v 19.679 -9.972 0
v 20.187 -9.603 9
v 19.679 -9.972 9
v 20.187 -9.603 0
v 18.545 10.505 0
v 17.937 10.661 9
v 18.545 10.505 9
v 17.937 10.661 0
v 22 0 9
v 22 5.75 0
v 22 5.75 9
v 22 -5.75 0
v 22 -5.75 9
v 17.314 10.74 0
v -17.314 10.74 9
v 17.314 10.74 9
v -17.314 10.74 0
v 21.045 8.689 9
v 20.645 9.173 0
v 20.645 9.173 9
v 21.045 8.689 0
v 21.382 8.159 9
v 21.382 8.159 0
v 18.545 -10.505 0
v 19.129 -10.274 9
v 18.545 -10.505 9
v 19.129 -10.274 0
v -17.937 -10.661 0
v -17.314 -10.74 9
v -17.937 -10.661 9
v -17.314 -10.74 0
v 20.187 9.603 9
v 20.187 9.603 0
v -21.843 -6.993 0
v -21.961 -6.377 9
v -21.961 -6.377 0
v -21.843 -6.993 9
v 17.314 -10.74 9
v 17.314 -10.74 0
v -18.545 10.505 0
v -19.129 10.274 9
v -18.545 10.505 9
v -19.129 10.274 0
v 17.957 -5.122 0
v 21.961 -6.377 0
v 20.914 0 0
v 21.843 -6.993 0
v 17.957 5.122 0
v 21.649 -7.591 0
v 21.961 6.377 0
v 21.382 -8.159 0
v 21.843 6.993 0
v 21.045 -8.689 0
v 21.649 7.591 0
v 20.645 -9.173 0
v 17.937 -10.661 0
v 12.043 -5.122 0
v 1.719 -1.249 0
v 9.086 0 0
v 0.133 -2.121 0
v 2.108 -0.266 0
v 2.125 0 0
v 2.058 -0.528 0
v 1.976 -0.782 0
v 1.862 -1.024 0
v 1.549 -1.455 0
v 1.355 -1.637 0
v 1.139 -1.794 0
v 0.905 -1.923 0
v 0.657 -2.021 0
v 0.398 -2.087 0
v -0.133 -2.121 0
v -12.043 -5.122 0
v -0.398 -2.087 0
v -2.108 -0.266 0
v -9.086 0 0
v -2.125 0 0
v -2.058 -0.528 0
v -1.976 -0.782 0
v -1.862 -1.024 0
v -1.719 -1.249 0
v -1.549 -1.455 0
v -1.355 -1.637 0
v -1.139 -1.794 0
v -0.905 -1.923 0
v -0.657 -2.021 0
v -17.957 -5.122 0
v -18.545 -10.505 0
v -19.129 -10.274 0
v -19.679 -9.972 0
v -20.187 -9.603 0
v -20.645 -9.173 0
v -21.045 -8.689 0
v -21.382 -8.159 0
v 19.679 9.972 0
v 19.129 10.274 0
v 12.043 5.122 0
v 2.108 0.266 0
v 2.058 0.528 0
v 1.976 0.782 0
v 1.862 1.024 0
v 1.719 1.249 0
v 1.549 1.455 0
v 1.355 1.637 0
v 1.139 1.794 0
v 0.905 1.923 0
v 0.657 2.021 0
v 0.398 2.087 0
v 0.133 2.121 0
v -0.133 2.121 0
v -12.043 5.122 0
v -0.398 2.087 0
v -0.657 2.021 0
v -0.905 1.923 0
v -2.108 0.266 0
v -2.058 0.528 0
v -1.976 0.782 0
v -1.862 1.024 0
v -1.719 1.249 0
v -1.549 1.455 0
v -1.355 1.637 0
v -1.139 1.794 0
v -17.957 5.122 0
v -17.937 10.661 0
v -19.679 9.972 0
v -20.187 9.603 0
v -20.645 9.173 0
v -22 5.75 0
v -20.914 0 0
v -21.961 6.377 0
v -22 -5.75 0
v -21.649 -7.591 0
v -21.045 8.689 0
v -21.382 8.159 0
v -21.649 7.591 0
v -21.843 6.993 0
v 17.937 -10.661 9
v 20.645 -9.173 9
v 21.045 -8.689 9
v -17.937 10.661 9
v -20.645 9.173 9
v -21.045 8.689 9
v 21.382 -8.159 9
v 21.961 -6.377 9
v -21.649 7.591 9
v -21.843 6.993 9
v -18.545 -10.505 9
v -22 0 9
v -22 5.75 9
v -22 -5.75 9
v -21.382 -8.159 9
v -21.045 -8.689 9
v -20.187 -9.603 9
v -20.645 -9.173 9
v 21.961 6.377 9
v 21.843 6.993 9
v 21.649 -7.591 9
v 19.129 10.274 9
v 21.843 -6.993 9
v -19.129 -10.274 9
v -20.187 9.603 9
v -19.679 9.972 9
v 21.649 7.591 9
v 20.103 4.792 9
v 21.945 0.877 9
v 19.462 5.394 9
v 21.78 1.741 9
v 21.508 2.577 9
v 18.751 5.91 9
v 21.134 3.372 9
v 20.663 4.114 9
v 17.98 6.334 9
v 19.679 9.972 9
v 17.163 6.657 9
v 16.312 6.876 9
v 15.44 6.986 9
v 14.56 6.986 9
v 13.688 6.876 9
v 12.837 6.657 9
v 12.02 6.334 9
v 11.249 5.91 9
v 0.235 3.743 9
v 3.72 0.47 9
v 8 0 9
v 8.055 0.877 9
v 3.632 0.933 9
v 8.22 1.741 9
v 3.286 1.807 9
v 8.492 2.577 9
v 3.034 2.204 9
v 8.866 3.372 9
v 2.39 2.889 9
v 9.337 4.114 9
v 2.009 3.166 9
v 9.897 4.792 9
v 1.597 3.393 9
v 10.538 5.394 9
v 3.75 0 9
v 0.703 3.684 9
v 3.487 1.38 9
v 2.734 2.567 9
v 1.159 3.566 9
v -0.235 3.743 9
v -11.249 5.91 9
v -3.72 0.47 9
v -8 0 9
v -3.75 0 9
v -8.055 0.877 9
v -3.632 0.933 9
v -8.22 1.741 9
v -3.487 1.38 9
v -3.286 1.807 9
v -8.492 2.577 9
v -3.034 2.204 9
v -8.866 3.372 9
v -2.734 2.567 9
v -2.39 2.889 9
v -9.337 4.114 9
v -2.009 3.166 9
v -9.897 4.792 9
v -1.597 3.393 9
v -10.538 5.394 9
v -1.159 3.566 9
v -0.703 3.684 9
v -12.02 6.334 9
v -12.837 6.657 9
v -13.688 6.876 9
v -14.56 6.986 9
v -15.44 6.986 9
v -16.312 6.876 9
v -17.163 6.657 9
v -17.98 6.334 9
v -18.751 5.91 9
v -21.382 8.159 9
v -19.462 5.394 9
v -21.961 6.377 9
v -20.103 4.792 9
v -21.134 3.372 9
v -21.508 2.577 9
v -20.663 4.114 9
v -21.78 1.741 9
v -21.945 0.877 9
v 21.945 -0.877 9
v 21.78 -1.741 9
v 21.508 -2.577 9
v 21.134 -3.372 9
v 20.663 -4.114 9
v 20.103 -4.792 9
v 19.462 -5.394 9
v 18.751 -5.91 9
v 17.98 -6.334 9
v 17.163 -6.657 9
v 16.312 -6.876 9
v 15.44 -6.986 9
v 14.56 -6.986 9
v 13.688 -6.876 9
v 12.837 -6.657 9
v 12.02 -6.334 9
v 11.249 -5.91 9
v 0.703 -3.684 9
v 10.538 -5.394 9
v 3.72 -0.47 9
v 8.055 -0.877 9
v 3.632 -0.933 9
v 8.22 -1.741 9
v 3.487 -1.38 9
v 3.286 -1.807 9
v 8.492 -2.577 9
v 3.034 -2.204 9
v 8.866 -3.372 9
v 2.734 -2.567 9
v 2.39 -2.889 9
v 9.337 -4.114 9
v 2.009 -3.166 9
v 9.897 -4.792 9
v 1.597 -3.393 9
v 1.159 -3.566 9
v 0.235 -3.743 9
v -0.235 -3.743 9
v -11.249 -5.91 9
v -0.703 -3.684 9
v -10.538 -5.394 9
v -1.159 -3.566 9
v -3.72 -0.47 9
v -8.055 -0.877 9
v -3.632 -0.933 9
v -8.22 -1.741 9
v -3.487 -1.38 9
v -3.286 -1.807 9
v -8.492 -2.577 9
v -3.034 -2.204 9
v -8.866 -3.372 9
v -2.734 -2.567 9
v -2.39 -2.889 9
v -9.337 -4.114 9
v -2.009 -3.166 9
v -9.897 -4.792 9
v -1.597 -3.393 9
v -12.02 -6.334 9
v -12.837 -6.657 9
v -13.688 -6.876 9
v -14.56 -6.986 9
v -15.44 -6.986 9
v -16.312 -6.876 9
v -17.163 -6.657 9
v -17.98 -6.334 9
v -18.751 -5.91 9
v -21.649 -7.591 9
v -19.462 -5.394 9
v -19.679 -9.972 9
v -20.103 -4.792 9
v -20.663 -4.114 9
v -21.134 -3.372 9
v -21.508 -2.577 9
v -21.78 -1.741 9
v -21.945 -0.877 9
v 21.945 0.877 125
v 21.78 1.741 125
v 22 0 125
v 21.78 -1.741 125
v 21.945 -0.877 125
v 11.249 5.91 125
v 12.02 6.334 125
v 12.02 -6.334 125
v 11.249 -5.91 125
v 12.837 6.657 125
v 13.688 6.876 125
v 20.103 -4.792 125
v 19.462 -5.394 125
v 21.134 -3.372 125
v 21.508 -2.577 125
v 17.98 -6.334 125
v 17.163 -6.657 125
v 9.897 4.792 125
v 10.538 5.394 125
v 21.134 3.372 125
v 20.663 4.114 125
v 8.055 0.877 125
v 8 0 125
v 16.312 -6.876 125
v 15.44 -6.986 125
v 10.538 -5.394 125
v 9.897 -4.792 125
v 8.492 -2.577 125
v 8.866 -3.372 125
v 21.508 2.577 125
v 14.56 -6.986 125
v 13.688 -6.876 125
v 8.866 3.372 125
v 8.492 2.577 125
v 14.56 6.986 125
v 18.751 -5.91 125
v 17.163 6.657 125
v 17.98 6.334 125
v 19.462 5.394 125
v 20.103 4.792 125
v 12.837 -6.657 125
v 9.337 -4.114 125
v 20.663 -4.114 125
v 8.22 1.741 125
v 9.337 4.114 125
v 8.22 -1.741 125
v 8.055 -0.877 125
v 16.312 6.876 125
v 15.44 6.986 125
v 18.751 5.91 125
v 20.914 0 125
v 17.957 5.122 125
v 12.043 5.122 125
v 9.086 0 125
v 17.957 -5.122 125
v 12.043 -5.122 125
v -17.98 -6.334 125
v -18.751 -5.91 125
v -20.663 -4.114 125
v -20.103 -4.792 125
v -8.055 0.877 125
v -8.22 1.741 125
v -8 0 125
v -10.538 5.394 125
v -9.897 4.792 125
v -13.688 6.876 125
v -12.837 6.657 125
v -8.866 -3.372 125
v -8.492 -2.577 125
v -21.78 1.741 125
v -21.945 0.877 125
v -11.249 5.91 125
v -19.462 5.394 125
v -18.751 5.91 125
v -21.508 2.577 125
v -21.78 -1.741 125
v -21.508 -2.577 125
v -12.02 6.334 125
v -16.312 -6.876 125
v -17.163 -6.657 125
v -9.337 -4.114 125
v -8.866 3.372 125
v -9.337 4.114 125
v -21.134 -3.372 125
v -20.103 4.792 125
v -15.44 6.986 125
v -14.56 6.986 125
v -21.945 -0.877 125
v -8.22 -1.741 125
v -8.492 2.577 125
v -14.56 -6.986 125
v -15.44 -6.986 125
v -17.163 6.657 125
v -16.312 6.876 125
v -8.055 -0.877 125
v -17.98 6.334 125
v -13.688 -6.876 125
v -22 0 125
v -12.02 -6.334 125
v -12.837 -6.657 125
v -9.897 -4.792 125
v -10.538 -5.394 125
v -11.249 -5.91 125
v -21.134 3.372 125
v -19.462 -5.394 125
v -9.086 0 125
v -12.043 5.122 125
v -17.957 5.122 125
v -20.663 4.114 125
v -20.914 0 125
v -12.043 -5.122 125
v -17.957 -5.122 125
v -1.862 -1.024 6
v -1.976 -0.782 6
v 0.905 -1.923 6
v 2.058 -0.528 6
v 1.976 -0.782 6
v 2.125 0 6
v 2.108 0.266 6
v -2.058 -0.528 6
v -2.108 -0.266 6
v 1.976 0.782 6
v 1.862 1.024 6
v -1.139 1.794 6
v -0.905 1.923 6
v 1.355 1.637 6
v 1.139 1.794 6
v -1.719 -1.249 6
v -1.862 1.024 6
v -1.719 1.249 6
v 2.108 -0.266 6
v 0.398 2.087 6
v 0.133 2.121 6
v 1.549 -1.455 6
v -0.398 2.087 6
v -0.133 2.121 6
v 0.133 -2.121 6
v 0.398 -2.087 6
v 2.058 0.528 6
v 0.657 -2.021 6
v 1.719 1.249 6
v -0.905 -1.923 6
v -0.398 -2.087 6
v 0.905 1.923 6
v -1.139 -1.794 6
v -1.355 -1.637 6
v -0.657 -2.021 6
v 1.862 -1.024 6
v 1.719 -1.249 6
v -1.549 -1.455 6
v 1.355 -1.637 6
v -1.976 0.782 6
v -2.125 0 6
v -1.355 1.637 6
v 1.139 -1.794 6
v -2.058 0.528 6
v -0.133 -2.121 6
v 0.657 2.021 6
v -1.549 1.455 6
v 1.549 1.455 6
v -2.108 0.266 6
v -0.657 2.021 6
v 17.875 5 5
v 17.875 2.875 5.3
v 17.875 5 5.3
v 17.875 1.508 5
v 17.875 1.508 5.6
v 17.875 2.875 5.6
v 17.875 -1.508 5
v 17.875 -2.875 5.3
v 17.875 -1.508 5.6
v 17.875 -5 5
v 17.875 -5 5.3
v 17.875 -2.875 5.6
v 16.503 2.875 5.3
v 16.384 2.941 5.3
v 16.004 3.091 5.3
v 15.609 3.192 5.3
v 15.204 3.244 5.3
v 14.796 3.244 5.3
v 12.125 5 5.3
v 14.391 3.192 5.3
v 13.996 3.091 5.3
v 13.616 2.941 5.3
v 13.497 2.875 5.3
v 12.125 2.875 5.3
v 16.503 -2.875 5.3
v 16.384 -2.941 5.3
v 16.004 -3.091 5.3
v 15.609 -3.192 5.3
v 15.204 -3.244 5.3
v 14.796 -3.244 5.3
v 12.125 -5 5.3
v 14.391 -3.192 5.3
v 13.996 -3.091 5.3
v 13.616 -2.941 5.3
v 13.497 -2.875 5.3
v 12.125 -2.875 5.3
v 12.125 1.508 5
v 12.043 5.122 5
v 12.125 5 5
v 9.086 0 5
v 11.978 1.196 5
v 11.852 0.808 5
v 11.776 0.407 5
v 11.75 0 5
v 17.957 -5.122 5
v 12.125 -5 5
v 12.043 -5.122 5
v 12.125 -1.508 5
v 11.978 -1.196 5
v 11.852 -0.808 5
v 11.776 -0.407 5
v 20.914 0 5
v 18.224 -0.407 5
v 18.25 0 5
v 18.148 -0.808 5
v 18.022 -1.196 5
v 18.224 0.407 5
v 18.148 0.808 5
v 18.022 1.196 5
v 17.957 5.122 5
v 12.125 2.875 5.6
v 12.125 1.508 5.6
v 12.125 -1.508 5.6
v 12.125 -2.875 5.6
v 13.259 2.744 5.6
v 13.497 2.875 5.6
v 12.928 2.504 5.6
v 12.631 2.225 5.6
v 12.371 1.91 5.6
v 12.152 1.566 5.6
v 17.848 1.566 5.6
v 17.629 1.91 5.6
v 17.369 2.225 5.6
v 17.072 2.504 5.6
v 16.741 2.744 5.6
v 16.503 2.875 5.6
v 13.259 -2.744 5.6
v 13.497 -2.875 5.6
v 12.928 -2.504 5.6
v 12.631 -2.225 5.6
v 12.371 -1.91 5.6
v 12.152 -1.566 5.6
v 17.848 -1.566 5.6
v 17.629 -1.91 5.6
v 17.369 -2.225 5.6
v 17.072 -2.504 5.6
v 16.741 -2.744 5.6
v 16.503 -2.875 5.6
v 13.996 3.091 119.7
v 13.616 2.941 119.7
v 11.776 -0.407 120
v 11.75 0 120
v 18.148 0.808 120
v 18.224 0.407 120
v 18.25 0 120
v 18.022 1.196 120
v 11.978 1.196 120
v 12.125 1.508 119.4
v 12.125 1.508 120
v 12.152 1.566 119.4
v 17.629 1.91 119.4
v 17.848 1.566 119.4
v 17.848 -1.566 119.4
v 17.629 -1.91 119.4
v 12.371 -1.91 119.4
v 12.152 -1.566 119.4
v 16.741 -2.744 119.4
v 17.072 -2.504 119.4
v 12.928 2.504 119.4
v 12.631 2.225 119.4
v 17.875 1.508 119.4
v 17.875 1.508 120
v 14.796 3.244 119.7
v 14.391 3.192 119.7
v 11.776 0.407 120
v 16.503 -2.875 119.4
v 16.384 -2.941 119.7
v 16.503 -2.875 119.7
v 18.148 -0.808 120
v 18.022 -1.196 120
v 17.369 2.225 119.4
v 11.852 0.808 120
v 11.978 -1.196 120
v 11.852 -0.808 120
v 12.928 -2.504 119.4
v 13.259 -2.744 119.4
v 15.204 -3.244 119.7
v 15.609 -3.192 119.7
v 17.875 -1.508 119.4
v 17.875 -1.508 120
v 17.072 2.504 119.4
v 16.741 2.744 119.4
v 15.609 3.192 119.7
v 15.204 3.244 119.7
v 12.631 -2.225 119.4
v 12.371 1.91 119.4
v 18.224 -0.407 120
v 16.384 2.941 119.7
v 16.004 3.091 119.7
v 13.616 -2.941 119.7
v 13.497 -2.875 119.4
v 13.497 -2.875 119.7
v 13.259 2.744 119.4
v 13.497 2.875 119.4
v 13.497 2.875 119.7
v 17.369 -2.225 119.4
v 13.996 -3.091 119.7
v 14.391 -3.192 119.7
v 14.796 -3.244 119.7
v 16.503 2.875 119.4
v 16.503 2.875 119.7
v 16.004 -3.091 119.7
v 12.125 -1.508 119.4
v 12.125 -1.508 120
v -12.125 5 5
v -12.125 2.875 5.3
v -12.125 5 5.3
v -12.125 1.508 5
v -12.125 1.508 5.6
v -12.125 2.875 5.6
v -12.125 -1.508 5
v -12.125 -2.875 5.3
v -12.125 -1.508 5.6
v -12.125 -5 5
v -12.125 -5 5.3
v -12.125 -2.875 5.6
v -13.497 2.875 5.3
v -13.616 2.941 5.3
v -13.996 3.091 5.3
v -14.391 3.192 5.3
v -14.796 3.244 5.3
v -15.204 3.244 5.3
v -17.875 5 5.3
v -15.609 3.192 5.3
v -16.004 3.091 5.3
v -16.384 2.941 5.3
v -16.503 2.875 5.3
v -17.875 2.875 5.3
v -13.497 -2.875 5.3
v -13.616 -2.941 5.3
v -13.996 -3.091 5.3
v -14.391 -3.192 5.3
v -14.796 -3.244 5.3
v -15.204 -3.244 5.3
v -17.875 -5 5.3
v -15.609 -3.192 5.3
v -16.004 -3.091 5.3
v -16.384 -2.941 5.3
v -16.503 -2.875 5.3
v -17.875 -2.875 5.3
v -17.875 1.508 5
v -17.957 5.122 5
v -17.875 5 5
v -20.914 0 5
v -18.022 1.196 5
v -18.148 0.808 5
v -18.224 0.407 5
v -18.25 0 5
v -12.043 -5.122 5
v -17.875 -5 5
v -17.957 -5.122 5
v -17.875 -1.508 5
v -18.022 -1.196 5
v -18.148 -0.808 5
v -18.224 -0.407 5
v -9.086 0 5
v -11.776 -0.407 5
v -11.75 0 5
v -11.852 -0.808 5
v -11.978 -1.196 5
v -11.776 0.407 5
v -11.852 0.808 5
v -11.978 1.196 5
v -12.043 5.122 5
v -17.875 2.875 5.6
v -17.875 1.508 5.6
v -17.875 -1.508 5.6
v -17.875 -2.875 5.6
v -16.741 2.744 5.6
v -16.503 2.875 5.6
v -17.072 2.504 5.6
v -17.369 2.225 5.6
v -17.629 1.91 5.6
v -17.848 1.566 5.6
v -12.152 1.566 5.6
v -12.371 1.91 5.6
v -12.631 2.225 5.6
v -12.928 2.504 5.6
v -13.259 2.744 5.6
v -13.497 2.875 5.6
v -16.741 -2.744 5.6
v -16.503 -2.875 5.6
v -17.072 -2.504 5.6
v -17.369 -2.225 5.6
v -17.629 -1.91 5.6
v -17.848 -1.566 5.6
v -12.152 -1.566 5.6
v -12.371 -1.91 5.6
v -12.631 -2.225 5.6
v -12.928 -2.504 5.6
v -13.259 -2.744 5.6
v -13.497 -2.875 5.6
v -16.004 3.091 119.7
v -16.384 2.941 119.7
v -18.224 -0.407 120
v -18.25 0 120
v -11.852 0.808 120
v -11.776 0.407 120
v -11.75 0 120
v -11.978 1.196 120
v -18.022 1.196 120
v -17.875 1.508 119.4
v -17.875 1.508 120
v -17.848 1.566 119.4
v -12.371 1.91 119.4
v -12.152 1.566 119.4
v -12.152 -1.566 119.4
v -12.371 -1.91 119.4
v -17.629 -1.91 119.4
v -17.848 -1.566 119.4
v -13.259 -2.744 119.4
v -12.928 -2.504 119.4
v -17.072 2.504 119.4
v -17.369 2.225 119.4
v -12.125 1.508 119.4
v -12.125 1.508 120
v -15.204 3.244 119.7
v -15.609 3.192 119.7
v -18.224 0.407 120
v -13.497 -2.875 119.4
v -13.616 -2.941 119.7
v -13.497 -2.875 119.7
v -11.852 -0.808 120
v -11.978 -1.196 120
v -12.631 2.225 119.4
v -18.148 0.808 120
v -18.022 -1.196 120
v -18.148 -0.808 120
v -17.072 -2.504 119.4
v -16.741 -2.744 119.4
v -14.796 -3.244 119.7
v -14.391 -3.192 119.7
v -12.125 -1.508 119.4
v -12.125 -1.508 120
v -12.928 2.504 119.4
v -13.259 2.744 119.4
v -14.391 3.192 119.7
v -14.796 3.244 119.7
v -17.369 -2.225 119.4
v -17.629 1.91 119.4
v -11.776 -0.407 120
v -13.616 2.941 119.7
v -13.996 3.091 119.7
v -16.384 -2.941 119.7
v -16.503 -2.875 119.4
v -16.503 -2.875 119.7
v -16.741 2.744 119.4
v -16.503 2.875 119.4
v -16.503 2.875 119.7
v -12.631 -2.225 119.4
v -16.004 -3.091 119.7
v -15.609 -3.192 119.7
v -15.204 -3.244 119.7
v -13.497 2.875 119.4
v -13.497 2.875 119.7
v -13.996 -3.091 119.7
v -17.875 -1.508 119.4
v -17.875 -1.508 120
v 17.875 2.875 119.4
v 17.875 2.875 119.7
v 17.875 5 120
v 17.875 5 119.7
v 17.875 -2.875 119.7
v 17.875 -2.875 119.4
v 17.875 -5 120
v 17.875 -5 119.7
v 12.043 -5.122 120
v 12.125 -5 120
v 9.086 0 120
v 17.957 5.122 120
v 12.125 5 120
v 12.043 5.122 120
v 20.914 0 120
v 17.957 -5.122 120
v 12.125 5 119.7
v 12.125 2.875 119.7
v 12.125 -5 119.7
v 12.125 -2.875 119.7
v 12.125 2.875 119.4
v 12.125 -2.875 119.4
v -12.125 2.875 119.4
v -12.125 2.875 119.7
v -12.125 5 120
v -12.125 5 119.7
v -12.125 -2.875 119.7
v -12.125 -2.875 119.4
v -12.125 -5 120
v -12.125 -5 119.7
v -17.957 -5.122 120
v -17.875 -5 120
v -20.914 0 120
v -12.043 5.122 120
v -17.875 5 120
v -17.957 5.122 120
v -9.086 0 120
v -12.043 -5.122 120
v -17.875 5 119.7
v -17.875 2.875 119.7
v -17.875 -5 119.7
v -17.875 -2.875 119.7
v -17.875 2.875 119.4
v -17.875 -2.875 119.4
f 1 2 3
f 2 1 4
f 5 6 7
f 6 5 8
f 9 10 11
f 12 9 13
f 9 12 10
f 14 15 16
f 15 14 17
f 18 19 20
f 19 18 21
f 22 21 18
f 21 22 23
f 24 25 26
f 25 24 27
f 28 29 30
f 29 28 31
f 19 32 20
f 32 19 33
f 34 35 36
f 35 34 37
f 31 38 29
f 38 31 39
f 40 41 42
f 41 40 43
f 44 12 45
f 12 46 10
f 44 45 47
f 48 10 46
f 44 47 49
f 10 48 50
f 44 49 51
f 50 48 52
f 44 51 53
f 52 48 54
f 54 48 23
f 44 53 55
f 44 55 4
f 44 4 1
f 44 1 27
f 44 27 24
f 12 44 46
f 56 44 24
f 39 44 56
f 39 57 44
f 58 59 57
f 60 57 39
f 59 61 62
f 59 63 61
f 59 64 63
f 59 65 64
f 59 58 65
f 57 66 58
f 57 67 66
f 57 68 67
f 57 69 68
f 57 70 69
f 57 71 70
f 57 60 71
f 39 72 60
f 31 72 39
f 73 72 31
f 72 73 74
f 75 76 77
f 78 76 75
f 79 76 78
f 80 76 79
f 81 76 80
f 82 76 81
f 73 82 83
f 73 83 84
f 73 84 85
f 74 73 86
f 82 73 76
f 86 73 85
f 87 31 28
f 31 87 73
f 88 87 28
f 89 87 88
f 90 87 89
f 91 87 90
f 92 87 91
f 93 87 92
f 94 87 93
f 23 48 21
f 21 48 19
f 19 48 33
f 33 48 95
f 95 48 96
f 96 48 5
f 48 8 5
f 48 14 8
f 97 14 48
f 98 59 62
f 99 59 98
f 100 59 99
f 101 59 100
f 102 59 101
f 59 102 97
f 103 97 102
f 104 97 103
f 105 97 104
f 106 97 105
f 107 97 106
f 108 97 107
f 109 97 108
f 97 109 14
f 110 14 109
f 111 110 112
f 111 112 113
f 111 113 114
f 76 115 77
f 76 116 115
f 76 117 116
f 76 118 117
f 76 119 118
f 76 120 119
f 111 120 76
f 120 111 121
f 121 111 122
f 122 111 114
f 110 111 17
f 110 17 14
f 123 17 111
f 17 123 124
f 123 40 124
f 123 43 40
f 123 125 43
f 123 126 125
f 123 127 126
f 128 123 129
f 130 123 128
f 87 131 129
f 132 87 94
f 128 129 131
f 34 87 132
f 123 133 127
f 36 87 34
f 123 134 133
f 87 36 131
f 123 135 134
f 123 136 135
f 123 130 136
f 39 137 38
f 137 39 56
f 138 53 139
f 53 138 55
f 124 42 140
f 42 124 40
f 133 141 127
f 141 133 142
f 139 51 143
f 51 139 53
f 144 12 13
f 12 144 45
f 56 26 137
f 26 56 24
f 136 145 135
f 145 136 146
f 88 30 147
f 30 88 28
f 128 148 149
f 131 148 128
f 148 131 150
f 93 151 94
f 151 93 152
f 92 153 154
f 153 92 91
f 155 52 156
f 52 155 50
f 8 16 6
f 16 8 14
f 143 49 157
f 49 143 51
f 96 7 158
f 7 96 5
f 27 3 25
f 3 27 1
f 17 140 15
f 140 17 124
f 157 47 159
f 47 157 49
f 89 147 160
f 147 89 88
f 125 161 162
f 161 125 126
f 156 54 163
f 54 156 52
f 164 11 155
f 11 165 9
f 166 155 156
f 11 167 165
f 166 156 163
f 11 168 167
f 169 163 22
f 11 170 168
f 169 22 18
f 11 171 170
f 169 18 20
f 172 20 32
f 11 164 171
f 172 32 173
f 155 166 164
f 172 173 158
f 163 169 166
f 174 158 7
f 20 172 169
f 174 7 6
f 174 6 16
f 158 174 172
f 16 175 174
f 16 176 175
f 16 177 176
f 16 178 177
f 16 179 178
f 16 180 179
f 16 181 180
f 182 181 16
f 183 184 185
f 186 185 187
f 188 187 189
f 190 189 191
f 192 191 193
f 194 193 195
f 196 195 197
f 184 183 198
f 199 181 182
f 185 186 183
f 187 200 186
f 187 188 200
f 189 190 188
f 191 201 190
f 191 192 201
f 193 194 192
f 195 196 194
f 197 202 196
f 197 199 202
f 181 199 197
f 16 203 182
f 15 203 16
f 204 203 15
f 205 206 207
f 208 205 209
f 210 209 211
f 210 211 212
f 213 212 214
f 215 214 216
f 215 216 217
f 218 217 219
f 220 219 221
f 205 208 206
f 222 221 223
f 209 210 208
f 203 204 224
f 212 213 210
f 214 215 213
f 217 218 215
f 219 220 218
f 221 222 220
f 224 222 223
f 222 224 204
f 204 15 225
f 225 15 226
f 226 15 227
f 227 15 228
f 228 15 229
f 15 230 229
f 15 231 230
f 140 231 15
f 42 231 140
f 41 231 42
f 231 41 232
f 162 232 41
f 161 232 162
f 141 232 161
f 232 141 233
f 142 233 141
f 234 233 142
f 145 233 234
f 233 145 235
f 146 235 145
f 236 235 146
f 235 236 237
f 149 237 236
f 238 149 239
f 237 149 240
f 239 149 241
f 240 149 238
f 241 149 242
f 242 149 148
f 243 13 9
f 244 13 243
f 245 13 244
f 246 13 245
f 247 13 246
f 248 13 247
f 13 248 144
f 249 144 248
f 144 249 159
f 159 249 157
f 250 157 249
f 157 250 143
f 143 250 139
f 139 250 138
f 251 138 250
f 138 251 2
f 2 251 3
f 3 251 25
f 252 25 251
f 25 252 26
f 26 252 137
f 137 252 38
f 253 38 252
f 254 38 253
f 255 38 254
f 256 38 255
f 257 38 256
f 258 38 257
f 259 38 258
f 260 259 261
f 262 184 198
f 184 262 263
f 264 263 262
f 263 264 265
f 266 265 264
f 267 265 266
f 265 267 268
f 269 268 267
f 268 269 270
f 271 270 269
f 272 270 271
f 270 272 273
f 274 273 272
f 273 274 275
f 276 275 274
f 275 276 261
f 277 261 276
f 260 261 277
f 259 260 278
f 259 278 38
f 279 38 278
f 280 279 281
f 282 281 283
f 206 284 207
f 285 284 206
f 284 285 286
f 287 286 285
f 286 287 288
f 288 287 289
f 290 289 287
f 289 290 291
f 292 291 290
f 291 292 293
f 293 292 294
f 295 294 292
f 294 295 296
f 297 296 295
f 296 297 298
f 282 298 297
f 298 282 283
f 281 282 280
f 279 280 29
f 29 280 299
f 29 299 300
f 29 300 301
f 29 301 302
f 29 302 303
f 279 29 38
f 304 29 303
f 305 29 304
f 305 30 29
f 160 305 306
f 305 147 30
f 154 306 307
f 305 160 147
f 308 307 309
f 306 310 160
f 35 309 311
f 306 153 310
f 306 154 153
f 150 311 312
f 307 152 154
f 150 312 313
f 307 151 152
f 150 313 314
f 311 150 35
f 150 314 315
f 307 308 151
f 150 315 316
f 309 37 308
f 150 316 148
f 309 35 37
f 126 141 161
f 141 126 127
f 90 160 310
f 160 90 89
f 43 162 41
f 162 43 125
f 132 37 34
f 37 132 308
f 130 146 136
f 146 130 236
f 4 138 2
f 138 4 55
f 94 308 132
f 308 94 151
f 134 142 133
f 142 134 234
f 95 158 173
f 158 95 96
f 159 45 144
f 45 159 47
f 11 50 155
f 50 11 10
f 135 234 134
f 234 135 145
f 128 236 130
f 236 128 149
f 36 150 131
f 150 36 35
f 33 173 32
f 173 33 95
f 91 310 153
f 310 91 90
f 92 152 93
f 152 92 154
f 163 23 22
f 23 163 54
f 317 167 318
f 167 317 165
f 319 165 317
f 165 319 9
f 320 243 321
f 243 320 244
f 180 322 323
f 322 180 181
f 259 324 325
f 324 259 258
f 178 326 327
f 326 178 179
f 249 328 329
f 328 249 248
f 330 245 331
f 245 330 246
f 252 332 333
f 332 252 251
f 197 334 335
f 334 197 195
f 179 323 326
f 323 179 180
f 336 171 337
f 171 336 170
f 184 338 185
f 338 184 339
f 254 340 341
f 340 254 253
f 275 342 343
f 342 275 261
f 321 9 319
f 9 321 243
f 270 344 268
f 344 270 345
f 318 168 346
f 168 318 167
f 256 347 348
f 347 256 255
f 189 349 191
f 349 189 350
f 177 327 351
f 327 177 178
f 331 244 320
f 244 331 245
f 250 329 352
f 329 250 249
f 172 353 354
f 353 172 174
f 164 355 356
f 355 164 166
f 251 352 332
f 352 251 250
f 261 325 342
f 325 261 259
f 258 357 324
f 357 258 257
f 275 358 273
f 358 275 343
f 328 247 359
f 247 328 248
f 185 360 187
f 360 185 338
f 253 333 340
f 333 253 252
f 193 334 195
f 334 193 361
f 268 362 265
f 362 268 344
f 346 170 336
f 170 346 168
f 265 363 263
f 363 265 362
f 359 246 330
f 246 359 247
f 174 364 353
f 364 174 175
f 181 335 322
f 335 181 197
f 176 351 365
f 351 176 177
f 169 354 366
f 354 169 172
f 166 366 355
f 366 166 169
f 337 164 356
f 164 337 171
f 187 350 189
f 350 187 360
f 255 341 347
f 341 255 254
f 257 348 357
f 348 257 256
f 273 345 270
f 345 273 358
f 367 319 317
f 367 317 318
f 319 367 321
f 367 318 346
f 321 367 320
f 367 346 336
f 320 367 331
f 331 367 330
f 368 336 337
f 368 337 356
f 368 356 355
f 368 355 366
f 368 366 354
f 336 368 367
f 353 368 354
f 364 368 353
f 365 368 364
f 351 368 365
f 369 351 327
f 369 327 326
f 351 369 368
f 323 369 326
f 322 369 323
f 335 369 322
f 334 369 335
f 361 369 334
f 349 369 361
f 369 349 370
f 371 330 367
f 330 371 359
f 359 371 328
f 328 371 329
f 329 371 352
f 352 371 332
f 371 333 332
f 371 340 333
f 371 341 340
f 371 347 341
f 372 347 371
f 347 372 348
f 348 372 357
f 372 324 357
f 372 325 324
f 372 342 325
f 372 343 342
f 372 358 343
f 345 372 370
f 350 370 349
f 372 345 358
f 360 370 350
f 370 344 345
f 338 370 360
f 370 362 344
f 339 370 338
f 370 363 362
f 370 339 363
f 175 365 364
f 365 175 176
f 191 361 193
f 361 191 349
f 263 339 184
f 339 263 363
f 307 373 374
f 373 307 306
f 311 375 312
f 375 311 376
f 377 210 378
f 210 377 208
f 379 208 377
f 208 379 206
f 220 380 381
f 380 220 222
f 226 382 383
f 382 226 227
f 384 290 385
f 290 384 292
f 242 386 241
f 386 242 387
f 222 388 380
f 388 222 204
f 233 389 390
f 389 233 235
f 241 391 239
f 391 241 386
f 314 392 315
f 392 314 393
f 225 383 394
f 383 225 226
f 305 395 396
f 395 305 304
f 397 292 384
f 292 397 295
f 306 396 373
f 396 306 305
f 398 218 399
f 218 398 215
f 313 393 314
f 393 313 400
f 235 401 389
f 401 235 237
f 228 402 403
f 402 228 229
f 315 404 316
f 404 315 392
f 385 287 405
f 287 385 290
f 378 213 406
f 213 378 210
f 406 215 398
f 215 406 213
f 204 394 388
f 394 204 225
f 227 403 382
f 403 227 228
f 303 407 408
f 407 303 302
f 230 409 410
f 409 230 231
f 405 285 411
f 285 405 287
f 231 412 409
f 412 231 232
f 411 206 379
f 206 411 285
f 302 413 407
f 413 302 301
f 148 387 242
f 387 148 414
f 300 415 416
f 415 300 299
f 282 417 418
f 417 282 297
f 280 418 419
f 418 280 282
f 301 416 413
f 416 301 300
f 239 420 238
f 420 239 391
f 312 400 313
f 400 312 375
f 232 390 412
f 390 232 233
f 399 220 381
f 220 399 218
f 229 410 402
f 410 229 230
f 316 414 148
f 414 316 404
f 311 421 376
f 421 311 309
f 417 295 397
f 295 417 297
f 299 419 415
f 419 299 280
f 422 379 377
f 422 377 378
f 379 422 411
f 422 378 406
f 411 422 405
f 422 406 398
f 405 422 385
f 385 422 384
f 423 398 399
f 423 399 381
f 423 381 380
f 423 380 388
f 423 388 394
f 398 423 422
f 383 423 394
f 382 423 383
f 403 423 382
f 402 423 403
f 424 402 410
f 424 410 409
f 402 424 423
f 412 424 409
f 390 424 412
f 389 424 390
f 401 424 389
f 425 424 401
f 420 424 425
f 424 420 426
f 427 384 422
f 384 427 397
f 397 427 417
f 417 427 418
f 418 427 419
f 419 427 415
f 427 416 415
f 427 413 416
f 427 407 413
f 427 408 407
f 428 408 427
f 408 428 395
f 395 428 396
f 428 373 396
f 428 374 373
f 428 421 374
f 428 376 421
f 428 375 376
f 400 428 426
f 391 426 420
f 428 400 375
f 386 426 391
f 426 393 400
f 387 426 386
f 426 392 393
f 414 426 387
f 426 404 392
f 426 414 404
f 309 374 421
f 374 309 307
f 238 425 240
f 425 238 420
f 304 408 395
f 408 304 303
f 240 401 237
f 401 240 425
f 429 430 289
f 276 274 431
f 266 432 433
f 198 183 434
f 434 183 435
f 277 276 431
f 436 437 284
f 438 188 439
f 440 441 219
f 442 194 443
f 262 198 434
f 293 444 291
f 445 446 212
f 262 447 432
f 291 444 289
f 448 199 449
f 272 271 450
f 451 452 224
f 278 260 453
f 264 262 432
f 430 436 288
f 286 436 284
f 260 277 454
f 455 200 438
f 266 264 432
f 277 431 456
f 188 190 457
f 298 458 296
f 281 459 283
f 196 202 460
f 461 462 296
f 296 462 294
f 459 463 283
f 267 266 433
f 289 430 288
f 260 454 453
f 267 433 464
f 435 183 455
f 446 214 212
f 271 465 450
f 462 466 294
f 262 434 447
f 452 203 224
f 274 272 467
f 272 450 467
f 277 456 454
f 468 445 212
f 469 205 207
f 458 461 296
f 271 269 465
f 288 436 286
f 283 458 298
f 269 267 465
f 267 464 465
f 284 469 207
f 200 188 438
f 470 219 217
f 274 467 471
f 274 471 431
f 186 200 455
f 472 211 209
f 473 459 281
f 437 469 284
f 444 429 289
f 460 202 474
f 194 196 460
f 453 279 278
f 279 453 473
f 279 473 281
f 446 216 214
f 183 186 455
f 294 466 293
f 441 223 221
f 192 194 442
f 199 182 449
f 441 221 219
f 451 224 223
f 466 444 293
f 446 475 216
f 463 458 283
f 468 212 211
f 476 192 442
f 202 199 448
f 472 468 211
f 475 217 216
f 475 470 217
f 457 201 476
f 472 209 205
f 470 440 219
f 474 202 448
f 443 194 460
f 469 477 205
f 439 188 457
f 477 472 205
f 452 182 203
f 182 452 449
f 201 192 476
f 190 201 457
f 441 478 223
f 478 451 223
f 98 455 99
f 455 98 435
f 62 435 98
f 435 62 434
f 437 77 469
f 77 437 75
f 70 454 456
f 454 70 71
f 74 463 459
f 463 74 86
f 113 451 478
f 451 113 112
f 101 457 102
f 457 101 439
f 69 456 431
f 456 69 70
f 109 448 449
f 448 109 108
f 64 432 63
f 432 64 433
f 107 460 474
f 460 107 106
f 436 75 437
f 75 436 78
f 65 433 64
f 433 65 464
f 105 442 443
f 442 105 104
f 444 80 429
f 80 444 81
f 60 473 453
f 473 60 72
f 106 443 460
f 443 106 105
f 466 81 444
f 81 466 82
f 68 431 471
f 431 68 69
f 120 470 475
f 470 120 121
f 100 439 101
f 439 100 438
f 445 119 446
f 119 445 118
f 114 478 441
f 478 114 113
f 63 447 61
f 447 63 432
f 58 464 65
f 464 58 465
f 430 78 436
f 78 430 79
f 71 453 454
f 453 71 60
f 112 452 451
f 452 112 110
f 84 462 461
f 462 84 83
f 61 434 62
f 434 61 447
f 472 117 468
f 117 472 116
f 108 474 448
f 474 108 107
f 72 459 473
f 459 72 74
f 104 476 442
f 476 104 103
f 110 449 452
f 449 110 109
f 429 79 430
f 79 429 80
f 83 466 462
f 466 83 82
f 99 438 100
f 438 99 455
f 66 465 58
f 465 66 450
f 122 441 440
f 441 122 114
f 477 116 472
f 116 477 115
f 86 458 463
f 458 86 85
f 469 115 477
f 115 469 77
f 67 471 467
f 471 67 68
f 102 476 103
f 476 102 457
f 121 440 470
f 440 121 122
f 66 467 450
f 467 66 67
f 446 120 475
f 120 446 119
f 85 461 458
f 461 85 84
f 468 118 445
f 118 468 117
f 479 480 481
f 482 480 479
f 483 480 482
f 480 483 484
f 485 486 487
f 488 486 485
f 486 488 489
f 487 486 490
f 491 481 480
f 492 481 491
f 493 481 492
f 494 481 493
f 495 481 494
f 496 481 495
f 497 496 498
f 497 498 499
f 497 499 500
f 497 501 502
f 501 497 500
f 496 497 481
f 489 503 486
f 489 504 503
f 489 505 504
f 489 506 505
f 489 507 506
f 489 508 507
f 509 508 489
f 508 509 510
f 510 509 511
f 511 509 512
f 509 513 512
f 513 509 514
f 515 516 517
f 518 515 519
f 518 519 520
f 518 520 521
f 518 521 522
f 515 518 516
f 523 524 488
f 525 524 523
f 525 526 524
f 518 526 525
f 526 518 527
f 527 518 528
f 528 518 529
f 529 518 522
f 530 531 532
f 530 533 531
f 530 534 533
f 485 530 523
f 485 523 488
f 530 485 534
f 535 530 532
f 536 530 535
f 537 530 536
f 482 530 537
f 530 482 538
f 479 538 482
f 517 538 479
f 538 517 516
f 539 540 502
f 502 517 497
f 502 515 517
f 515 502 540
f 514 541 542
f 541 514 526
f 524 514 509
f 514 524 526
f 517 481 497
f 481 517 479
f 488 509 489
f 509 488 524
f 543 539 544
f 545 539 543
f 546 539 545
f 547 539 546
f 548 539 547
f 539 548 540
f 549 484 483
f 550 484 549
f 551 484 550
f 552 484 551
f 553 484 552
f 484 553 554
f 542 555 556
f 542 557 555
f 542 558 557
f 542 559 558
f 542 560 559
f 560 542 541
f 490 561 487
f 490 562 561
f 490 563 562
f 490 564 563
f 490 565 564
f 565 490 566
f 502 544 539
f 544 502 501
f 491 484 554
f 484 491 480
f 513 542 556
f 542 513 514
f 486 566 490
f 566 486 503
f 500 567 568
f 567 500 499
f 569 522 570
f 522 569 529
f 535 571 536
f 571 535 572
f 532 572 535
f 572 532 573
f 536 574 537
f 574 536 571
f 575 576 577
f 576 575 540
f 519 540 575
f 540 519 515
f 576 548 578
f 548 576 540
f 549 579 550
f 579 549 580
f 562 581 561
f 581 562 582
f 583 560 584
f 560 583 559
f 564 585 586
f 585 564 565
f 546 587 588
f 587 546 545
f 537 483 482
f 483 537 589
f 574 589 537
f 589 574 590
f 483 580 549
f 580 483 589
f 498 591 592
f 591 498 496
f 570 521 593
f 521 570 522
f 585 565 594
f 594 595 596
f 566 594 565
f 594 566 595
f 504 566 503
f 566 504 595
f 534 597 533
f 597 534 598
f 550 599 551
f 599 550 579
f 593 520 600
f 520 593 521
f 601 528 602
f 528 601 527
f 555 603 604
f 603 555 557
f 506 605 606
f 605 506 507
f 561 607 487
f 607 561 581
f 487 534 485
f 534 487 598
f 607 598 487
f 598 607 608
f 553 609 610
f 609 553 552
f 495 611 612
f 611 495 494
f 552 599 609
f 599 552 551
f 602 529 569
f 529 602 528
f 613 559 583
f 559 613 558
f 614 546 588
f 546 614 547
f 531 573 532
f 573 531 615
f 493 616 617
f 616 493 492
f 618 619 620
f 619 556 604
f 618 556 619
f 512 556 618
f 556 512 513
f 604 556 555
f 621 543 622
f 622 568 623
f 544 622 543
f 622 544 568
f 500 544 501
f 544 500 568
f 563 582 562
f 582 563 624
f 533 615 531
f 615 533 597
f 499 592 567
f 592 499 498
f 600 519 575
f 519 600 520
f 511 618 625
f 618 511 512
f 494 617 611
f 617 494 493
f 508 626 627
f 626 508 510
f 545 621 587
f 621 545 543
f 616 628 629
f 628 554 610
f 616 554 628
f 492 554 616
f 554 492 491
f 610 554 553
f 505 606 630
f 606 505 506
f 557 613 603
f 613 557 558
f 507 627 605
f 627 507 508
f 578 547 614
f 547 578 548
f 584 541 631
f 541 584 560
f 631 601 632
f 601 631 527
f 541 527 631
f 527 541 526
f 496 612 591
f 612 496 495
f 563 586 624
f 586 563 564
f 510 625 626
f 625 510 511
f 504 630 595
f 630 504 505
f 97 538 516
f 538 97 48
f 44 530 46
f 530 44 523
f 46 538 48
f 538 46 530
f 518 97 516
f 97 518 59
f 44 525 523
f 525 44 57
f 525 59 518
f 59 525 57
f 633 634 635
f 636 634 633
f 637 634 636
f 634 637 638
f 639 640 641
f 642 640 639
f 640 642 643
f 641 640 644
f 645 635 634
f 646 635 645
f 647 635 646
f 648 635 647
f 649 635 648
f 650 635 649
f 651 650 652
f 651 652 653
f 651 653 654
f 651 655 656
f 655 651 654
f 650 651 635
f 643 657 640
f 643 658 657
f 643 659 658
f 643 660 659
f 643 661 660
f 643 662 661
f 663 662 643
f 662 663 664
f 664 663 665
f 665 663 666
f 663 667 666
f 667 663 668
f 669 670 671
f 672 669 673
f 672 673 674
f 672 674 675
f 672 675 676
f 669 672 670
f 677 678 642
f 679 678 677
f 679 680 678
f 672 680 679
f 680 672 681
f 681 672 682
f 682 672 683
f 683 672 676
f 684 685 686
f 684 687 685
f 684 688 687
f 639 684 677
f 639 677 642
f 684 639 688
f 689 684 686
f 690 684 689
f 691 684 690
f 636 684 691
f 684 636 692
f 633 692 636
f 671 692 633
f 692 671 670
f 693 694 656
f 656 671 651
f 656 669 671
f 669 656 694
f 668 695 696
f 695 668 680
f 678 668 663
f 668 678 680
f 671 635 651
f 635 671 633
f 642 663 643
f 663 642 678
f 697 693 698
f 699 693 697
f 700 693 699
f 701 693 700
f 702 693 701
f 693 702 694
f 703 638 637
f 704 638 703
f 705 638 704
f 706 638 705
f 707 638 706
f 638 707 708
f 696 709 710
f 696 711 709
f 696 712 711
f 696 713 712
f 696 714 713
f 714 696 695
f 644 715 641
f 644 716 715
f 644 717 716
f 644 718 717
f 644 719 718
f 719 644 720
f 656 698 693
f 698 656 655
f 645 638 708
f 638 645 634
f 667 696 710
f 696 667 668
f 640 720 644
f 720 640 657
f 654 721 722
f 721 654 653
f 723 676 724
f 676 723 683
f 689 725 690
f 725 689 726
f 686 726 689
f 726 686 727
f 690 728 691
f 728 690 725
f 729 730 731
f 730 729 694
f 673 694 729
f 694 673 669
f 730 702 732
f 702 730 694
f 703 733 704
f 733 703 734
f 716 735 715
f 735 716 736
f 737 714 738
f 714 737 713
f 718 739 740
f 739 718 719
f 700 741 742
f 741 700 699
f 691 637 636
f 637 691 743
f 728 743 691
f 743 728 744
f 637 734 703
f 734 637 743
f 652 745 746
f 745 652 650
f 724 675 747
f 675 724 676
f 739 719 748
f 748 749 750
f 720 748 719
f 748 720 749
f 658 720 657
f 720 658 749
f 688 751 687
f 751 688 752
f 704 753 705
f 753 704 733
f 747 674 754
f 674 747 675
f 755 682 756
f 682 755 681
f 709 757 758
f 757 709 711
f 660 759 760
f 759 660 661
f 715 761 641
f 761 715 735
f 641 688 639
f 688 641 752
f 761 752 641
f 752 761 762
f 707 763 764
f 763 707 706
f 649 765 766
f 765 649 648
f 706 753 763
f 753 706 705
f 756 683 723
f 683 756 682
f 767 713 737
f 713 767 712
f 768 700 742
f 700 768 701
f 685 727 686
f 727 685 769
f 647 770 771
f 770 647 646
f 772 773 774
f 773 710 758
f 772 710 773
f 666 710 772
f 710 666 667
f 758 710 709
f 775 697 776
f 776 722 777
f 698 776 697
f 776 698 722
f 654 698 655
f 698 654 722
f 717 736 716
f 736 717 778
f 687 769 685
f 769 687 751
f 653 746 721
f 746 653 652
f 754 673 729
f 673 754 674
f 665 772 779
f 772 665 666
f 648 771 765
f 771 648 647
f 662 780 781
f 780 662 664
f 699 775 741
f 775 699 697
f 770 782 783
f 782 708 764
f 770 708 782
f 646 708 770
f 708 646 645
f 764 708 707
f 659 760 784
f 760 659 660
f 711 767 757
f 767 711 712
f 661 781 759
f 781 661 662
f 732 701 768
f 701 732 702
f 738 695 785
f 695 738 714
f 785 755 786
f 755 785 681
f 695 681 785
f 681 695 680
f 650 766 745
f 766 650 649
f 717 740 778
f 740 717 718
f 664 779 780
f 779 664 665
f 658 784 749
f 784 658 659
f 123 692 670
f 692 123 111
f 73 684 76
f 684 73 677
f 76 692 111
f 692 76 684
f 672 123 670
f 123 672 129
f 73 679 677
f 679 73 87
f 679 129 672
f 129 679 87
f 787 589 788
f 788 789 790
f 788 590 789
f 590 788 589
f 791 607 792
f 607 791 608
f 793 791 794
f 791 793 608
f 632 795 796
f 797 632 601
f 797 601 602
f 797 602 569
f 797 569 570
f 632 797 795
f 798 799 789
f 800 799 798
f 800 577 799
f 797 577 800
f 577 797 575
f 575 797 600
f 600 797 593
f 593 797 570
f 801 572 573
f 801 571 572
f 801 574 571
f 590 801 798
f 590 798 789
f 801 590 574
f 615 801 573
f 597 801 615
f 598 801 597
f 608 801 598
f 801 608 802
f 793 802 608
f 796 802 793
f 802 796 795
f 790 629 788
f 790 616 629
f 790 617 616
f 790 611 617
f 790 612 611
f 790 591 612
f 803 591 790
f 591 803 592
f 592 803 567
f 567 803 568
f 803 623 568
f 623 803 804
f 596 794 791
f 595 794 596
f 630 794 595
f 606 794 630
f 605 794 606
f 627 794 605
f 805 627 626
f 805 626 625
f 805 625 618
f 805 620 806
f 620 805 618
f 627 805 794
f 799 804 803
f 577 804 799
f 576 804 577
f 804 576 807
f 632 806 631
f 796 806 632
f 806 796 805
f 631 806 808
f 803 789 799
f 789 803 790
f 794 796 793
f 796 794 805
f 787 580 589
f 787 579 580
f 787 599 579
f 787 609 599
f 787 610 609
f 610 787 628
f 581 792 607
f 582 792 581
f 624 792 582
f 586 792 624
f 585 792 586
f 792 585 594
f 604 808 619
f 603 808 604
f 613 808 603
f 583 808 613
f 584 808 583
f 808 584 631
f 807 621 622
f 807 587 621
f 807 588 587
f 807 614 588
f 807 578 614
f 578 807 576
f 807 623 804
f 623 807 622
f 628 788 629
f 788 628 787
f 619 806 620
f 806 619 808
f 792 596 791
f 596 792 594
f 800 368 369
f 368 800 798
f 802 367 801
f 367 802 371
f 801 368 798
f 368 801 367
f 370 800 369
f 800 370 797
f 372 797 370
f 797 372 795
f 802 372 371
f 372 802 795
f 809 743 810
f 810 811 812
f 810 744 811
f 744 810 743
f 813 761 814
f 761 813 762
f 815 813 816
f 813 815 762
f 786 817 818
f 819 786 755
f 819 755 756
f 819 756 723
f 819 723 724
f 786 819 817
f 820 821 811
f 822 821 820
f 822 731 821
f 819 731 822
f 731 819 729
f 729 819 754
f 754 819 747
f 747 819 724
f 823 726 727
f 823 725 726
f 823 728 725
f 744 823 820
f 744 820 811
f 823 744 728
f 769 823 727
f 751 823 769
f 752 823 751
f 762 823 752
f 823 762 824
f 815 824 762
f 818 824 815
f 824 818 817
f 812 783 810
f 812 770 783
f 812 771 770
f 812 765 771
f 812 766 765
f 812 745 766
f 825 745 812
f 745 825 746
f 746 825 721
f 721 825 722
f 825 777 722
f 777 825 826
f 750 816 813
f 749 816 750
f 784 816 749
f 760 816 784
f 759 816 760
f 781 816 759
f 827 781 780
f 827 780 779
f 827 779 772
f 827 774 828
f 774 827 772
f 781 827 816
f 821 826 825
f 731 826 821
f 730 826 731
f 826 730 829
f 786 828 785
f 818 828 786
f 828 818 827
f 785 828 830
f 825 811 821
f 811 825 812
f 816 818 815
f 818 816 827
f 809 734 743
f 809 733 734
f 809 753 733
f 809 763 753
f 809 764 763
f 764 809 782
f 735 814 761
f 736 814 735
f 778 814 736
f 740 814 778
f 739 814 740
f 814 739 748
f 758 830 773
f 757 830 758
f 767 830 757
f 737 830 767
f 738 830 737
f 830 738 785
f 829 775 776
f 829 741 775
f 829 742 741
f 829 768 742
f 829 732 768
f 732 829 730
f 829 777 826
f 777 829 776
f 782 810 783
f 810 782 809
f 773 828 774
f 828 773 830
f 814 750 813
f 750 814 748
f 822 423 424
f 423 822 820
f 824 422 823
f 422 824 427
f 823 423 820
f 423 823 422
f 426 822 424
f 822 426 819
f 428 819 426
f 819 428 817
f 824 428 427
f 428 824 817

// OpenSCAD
$fn = 50;


difference() {
	union() {
		hull() {
			translate(v = [-17.0000000000, 5.7500000000, 0]) {
				cylinder(h = 9, r = 5);
			}
			translate(v = [17.0000000000, 5.7500000000, 0]) {
				cylinder(h = 9, r = 5);
			}
			translate(v = [-17.0000000000, -5.7500000000, 0]) {
				cylinder(h = 9, r = 5);
			}
			translate(v = [17.0000000000, -5.7500000000, 0]) {
				cylinder(h = 9, r = 5);
			}
		}
		translate(v = [15.0000000000, 0, 0.0000000000]) {
			cylinder(h = 125, r = 7.0000000000);
		}
		translate(v = [-15.0000000000, 0, 0.0000000000]) {
			cylinder(h = 125, r = 7.0000000000);
		}
		translate(v = [15.0000000000, 0, 119.0000000000]) {
			cylinder(h = 6, r = 7.0000000000);
		}
		translate(v = [-15.0000000000, 0, 119.0000000000]) {
			cylinder(h = 6, r = 7.0000000000);
		}
	}
	union() {
		translate(v = [0, 0, 9]) {
			rotate(a = [0, 0, 0]) {
				difference() {
					union() {
						#translate(v = [0, 0, -120.0000000000]) {
							cylinder(h = 120, r = 2.0000000000);
						}
						#translate(v = [0, 0, -3]) {
							cylinder(h = 3, r1 = 2.1250000000, r2 = 3.7500000000);
						}
						#translate(v = [0, 0, -120.0000000000]) {
							cylinder(h = 120, r = 2.1250000000);
						}
						#translate(v = [0, 0, -120.0000000000]) {
							cylinder(h = 120, r = 2.0000000000);
						}
					}
					union();
				}
			}
		}
		translate(v = [15.0000000000, 0, 0]) {
			rotate(a = [0, 0, 0]) {
				difference() {
					union() {
						#translate(v = [-2.8750000000, -5.0000000000, -0.3000000000]) {
							cube(size = [5.7500000000, 10, 0.3000000000]);
						}
						#translate(v = [-2.8750000000, -2.8750000000, -0.6000000000]) {
							cube(size = [5.7500000000, 5.7500000000, 0.3000000000]);
						}
						#translate(v = [-2.8750000000, -5.0000000000, 5]) {
							cube(size = [5.7500000000, 10, 0.3000000000]);
						}
						#translate(v = [-2.8750000000, -2.8750000000, 5.3000000000]) {
							cube(size = [5.7500000000, 5.7500000000, 0.3000000000]);
						}
						#translate(v = [0, 0, -100.0000000000]) {
							cylinder(h = 200, r = 3.2500000000);
						}
						#linear_extrude(height = 5) {
							polygon(points = [[5.9142500000, 0.0000000000], [2.9571250000, 5.1218907443], [-2.9571250000, 5.1218907443], [-5.9142500000, 0.0000000000], [-2.9571250000, -5.1218907443], [2.9571250000, -5.1218907443]]);
						}
						#translate(v = [-2.8750000000, -5.0000000000, -0.3000000000]) {
							cube(size = [5.7500000000, 10, 0.3000000000]);
						}
						#translate(v = [-2.8750000000, -2.8750000000, -0.6000000000]) {
							cube(size = [5.7500000000, 5.7500000000, 0.3000000000]);
						}
						#translate(v = [-2.8750000000, -5.0000000000, 5]) {
							cube(size = [5.7500000000, 10, 0.3000000000]);
						}
						#translate(v = [-2.8750000000, -2.8750000000, 5.3000000000]) {
							cube(size = [5.7500000000, 5.7500000000, 0.3000000000]);
						}
						#translate(v = [0, 0, -100.0000000000]) {
							cylinder(h = 200, r = 3.2500000000);
						}
						#translate(v = [-2.8750000000, -5.0000000000, -0.3000000000]) {
							cube(size = [5.7500000000, 10, 0.3000000000]);
						}
						#translate(v = [-2.8750000000, -2.8750000000, -0.6000000000]) {
							cube(size = [5.7500000000, 5.7500000000, 0.3000000000]);
						}
						#translate(v = [-2.8750000000, -5.0000000000, 5]) {
							cube(size = [5.7500000000, 10, 0.3000000000]);
						}
						#translate(v = [-2.8750000000, -2.8750000000, 5.3000000000]) {
							cube(size = [5.7500000000, 5.7500000000, 0.3000000000]);
						}
						#translate(v = [0, 0, -100.0000000000]) {
							cylinder(h = 200, r = 3.2500000000);
						}
					}
					union();
				}
			}
		}
		translate(v = [-15.0000000000, 0, 0]) {
			rotate(a = [0, 0, 0]) {
				difference() {
					union() {
						#translate(v = [-2.8750000000, -5.0000000000, -0.3000000000]) {
							cube(size = [5.7500000000, 10, 0.3000000000]);
						}
						#translate(v = [-2.8750000000, -2.8750000000, -0.6000000000]) {
							cube(size = [5.7500000000, 5.7500000000, 0.3000000000]);
						}
						#translate(v = [-2.8750000000, -5.0000000000, 5]) {
							cube(size = [5.7500000000, 10, 0.3000000000]);
						}
						#translate(v = [-2.8750000000, -2.8750000000, 5.3000000000]) {
							cube(size = [5.7500000000, 5.7500000000, 0.3000000000]);
						}
						#translate(v = [0, 0, -100.0000000000]) {
							cylinder(h = 200, r = 3.2500000000);
						}
						#linear_extrude(height = 5) {
							polygon(points = [[5.9142500000, 0.0000000000], [2.9571250000, 5.1218907443], [-2.9571250000, 5.1218907443], [-5.9142500000, 0.0000000000], [-2.9571250000, -5.1218907443], [2.9571250000, -5.1218907443]]);
						}
						#translate(v = [-2.8750000000, -5.0000000000, -0.3000000000]) {
							cube(size = [5.7500000000, 10, 0.3000000000]);
						}
						#translate(v = [-2.8750000000, -2.8750000000, -0.6000000000]) {
							cube(size = [5.7500000000, 5.7500000000, 0.3000000000]);
						}
						#translate(v = [-2.8750000000, -5.0000000000, 5]) {
							cube(size = [5.7500000000, 10, 0.3000000000]);
						}
						#translate(v = [-2.8750000000, -2.8750000000, 5.3000000000]) {
							cube(size = [5.7500000000, 5.7500000000, 0.3000000000]);
						}
						#translate(v = [0, 0, -100.0000000000]) {
							cylinder(h = 200, r = 3.2500000000);
						}
						#translate(v = [-2.8750000000, -5.0000000000, -0.3000000000]) {
							cube(size = [5.7500000000, 10, 0.3000000000]);
						}
						#translate(v = [-2.8750000000, -2.8750000000, -0.6000000000]) {
							cube(size = [5.7500000000, 5.7500000000, 0.3000000000]);
						}
						#translate(v = [-2.8750000000, -5.0000000000, 5]) {
							cube(size = [5.7500000000, 10, 0.3000000000]);
						}
						#translate(v = [-2.8750000000, -2.8750000000, 5.3000000000]) {
							cube(size = [5.7500000000, 5.7500000000, 0.3000000000]);
						}
						#translate(v = [0, 0, -100.0000000000]) {
							cylinder(h = 200, r = 3.2500000000);
						}
					}
					union();
				}
			}
		}
		translate(v = [15.0000000000, 0, 125]) {
			rotate(a = [0, 0, 0]) {
				difference() {
					union() {
						#translate(v = [-2.8750000000, -5.0000000000, -5.3000000000]) {
							cube(size = [5.7500000000, 10, 0.3000000000]);
						}
						#translate(v = [-2.8750000000, -2.8750000000, -5.6000000000]) {
							cube(size = [5.7500000000, 5.7500000000, 0.3000000000]);
						}
						#translate(v = [-2.8750000000, -5.0000000000, 0]) {
							cube(size = [5.7500000000, 10, 0.3000000000]);
						}
						#translate(v = [-2.8750000000, -2.8750000000, 0.3000000000]) {
							cube(size = [5.7500000000, 5.7500000000, 0.3000000000]);
						}
						#translate(v = [0, 0, -100.0000000000]) {
							cylinder(h = 200, r = 3.2500000000);
						}
						translate(v = [0, 0, -5]) {
							#linear_extrude(height = 5) {
								polygon(points = [[5.9142500000, 0.0000000000], [2.9571250000, 5.1218907443], [-2.9571250000, 5.1218907443], [-5.9142500000, 0.0000000000], [-2.9571250000, -5.1218907443], [2.9571250000, -5.1218907443]]);
							}
						}
						#translate(v = [-2.8750000000, -5.0000000000, -5.3000000000]) {
							cube(size = [5.7500000000, 10, 0.3000000000]);
						}
						#translate(v = [-2.8750000000, -2.8750000000, -5.6000000000]) {
							cube(size = [5.7500000000, 5.7500000000, 0.3000000000]);
						}
						#translate(v = [-2.8750000000, -5.0000000000, 0]) {
							cube(size = [5.7500000000, 10, 0.3000000000]);
						}
						#translate(v = [-2.8750000000, -2.8750000000, 0.3000000000]) {
							cube(size = [5.7500000000, 5.7500000000, 0.3000000000]);
						}
						#translate(v = [0, 0, -100.0000000000]) {
							cylinder(h = 200, r = 3.2500000000);
						}
						#translate(v = [-2.8750000000, -5.0000000000, -5.3000000000]) {
							cube(size = [5.7500000000, 10, 0.3000000000]);
						}
						#translate(v = [-2.8750000000, -2.8750000000, -5.6000000000]) {
							cube(size = [5.7500000000, 5.7500000000, 0.3000000000]);
						}
						#translate(v = [-2.8750000000, -5.0000000000, 0]) {
							cube(size = [5.7500000000, 10, 0.3000000000]);
						}
						#translate(v = [-2.8750000000, -2.8750000000, 0.3000000000]) {
							cube(size = [5.7500000000, 5.7500000000, 0.3000000000]);
						}
						#translate(v = [0, 0, -100.0000000000]) {
							cylinder(h = 200, r = 3.2500000000);
						}
					}
					union();
				}
			}
		}
		translate(v = [-15.0000000000, 0, 125]) {
			rotate(a = [0, 0, 0]) {
				difference() {
					union() {
						#translate(v = [-2.8750000000, -5.0000000000, -5.3000000000]) {
							cube(size = [5.7500000000, 10, 0.3000000000]);
						}
						#translate(v = [-2.8750000000, -2.8750000000, -5.6000000000]) {
							cube(size = [5.7500000000, 5.7500000000, 0.3000000000]);
						}
						#translate(v = [-2.8750000000, -5.0000000000, 0]) {
							cube(size = [5.7500000000, 10, 0.3000000000]);
						}
						#translate(v = [-2.8750000000, -2.8750000000, 0.3000000000]) {
							cube(size = [5.7500000000, 5.7500000000, 0.3000000000]);
						}
						#translate(v = [0, 0, -100.0000000000]) {
							cylinder(h = 200, r = 3.2500000000);
						}
						translate(v = [0, 0, -5]) {
							#linear_extrude(height = 5) {
								polygon(points = [[5.9142500000, 0.0000000000], [2.9571250000, 5.1218907443], [-2.9571250000, 5.1218907443], [-5.9142500000, 0.0000000000], [-2.9571250000, -5.1218907443], [2.9571250000, -5.1218907443]]);
							}
						}
						#translate(v = [-2.8750000000, -5.0000000000, -5.3000000000]) {
							cube(size = [5.7500000000, 10, 0.3000000000]);
						}
						#translate(v = [-2.8750000000, -2.8750000000, -5.6000000000]) {
							cube(size = [5.7500000000, 5.7500000000, 0.3000000000]);
						}
						#translate(v = [-2.8750000000, -5.0000000000, 0]) {
							cube(size = [5.7500000000, 10, 0.3000000000]);
						}
						#translate(v = [-2.8750000000, -2.8750000000, 0.3000000000]) {
							cube(size = [5.7500000000, 5.7500000000, 0.3000000000]);
						}
						#translate(v = [0, 0, -100.0000000000]) {
							cylinder(h = 200, r = 3.2500000000);
						}
						#translate(v = [-2.8750000000, -5.0000000000, -5.3000000000]) {
							cube(size = [5.7500000000, 10, 0.3000000000]);
						}
						#translate(v = [-2.8750000000, -2.8750000000, -5.6000000000]) {
							cube(size = [5.7500000000, 5.7500000000, 0.3000000000]);
						}
						#translate(v = [-2.8750000000, -5.0000000000, 0]) {
							cube(size = [5.7500000000, 10, 0.3000000000]);
						}
						#translate(v = [-2.8750000000, -2.8750000000, 0.3000000000]) {
							cube(size = [5.7500000000, 5.7500000000, 0.3000000000]);
						}
						#translate(v = [0, 0, -100.0000000000]) {
							cylinder(h = 200, r = 3.2500000000);
						}
					}
					union();
				}
			}
		}
	}
}
